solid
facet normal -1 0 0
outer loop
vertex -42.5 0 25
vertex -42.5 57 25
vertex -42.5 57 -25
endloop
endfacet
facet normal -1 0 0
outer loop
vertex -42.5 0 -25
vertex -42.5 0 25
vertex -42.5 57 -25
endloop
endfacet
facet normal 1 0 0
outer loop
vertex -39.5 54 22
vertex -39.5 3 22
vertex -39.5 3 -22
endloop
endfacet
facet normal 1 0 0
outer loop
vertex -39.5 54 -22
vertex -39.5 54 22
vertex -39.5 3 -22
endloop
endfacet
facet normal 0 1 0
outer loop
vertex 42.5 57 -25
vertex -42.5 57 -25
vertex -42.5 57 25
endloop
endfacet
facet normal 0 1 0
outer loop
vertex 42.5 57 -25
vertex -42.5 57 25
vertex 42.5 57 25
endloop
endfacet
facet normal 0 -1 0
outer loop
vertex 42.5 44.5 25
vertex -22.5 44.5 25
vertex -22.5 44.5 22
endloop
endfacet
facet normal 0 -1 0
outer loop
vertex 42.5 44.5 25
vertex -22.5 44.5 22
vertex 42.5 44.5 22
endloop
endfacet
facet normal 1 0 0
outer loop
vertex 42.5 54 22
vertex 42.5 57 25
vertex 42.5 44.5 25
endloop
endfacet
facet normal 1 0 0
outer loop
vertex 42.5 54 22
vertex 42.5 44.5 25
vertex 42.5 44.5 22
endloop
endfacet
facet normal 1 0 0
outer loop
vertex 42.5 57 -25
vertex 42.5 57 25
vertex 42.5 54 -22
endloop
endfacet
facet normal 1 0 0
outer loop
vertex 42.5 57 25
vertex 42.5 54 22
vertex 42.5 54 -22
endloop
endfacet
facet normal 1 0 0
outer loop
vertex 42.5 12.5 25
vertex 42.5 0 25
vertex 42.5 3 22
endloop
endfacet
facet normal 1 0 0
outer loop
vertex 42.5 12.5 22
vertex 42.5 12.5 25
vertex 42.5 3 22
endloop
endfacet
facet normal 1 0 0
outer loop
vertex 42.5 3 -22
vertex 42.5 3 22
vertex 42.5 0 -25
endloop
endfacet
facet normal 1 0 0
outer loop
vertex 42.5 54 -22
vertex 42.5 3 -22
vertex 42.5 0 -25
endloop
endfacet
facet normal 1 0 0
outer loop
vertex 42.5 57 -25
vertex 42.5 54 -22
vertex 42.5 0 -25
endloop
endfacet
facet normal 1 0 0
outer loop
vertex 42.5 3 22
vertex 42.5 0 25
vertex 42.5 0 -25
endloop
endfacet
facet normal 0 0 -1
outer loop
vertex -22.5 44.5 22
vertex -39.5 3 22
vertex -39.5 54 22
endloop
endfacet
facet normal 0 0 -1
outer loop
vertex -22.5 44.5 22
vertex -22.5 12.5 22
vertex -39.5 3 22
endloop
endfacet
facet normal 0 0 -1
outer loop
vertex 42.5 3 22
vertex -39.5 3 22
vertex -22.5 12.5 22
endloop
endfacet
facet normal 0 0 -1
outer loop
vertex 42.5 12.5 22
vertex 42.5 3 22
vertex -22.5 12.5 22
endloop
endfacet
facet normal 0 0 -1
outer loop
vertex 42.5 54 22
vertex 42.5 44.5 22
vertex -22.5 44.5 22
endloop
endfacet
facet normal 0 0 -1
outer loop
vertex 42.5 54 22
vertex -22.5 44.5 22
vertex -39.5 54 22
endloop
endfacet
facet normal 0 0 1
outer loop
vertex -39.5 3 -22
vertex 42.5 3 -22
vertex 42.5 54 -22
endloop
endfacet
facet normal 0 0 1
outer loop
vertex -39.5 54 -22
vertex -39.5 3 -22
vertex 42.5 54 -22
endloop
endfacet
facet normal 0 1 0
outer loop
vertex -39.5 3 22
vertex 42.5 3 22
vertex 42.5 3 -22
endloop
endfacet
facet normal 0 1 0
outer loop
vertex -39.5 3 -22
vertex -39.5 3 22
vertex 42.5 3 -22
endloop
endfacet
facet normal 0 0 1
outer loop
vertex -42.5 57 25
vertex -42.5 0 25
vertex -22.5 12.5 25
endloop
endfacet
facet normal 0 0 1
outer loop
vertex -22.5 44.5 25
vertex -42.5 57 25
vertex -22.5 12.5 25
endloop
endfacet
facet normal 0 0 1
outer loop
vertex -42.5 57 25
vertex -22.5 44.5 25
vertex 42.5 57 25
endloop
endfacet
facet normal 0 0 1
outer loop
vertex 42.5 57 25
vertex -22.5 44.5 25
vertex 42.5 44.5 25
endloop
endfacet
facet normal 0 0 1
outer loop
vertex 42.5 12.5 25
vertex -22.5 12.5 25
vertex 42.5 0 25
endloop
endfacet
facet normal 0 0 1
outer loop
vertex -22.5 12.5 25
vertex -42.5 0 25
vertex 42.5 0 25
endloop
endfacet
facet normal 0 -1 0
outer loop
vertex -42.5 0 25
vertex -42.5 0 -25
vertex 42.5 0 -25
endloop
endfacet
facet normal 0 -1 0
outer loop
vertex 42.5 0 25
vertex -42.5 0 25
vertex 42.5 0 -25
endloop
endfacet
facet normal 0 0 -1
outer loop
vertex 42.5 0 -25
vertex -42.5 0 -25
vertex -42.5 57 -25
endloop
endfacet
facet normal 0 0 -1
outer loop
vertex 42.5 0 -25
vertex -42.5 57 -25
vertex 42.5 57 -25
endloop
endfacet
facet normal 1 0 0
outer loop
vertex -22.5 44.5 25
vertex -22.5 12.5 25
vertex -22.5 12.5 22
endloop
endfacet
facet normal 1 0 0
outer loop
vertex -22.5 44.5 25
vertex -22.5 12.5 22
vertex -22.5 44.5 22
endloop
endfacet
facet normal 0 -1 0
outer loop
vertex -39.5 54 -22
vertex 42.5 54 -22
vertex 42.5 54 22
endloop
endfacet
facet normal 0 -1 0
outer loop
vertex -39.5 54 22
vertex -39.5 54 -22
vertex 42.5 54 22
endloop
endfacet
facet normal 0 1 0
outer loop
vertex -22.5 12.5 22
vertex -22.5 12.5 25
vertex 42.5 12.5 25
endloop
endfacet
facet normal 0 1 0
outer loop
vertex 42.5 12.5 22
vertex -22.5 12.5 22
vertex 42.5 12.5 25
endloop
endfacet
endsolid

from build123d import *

# Parameters (mm, degrees)
SKETCH_1_W          = 85
SKETCH_1_H          = 50
EXTRUDE_1_DEPTH     = 57
SKETCH_3_W          = 22
SKETCH_3_H          = 51
CUT_EXTRUDE_2_DEPTH = 82
CUT_EXTRUDE_4_REACH = 88.921
SKETCH_4_W          = 65
SKETCH_4_H          = 32


with BuildPart() as part:
    # 草图1 → 凸台-拉伸1 (new body)
    with BuildSketch(Plane(origin=(0, 0, 0), x_dir=(1, 0, 0), z_dir=(0, 1, 0))):
        Rectangle(SKETCH_1_W, SKETCH_1_H)
    extrude(amount=EXTRUDE_1_DEPTH)

    # 草图3 → 切除-拉伸2 (cut)
    with BuildSketch(Plane(origin=(42.5, 0, 0), x_dir=(0, 0, -1), z_dir=(1, 0, 0))):
        with Locations((-11, 28.5)):
            Rectangle(SKETCH_3_W, SKETCH_3_H)
        with Locations((11, 28.5)):
            Rectangle(SKETCH_3_W, SKETCH_3_H)
    extrude(amount=-CUT_EXTRUDE_2_DEPTH, mode=Mode.SUBTRACT)

    # 草图4 → 切除-拉伸4 (cut, up to next)
    with BuildSketch(Plane.XY.offset(25), mode=Mode.PRIVATE) as cut_extrude_4_sk1:
        with Locations((10, 28.5)):
            Rectangle(SKETCH_4_W, SKETCH_4_H)
    cut_extrude_4_tool1 = extrude(cut_extrude_4_sk1.sketch, amount=-CUT_EXTRUDE_4_REACH, mode=Mode.PRIVATE) & part.part
    add(cut_extrude_4_tool1.solids().sort_by_distance((10, 28.5, 25))[0], mode=Mode.SUBTRACT)


solid = part.part
